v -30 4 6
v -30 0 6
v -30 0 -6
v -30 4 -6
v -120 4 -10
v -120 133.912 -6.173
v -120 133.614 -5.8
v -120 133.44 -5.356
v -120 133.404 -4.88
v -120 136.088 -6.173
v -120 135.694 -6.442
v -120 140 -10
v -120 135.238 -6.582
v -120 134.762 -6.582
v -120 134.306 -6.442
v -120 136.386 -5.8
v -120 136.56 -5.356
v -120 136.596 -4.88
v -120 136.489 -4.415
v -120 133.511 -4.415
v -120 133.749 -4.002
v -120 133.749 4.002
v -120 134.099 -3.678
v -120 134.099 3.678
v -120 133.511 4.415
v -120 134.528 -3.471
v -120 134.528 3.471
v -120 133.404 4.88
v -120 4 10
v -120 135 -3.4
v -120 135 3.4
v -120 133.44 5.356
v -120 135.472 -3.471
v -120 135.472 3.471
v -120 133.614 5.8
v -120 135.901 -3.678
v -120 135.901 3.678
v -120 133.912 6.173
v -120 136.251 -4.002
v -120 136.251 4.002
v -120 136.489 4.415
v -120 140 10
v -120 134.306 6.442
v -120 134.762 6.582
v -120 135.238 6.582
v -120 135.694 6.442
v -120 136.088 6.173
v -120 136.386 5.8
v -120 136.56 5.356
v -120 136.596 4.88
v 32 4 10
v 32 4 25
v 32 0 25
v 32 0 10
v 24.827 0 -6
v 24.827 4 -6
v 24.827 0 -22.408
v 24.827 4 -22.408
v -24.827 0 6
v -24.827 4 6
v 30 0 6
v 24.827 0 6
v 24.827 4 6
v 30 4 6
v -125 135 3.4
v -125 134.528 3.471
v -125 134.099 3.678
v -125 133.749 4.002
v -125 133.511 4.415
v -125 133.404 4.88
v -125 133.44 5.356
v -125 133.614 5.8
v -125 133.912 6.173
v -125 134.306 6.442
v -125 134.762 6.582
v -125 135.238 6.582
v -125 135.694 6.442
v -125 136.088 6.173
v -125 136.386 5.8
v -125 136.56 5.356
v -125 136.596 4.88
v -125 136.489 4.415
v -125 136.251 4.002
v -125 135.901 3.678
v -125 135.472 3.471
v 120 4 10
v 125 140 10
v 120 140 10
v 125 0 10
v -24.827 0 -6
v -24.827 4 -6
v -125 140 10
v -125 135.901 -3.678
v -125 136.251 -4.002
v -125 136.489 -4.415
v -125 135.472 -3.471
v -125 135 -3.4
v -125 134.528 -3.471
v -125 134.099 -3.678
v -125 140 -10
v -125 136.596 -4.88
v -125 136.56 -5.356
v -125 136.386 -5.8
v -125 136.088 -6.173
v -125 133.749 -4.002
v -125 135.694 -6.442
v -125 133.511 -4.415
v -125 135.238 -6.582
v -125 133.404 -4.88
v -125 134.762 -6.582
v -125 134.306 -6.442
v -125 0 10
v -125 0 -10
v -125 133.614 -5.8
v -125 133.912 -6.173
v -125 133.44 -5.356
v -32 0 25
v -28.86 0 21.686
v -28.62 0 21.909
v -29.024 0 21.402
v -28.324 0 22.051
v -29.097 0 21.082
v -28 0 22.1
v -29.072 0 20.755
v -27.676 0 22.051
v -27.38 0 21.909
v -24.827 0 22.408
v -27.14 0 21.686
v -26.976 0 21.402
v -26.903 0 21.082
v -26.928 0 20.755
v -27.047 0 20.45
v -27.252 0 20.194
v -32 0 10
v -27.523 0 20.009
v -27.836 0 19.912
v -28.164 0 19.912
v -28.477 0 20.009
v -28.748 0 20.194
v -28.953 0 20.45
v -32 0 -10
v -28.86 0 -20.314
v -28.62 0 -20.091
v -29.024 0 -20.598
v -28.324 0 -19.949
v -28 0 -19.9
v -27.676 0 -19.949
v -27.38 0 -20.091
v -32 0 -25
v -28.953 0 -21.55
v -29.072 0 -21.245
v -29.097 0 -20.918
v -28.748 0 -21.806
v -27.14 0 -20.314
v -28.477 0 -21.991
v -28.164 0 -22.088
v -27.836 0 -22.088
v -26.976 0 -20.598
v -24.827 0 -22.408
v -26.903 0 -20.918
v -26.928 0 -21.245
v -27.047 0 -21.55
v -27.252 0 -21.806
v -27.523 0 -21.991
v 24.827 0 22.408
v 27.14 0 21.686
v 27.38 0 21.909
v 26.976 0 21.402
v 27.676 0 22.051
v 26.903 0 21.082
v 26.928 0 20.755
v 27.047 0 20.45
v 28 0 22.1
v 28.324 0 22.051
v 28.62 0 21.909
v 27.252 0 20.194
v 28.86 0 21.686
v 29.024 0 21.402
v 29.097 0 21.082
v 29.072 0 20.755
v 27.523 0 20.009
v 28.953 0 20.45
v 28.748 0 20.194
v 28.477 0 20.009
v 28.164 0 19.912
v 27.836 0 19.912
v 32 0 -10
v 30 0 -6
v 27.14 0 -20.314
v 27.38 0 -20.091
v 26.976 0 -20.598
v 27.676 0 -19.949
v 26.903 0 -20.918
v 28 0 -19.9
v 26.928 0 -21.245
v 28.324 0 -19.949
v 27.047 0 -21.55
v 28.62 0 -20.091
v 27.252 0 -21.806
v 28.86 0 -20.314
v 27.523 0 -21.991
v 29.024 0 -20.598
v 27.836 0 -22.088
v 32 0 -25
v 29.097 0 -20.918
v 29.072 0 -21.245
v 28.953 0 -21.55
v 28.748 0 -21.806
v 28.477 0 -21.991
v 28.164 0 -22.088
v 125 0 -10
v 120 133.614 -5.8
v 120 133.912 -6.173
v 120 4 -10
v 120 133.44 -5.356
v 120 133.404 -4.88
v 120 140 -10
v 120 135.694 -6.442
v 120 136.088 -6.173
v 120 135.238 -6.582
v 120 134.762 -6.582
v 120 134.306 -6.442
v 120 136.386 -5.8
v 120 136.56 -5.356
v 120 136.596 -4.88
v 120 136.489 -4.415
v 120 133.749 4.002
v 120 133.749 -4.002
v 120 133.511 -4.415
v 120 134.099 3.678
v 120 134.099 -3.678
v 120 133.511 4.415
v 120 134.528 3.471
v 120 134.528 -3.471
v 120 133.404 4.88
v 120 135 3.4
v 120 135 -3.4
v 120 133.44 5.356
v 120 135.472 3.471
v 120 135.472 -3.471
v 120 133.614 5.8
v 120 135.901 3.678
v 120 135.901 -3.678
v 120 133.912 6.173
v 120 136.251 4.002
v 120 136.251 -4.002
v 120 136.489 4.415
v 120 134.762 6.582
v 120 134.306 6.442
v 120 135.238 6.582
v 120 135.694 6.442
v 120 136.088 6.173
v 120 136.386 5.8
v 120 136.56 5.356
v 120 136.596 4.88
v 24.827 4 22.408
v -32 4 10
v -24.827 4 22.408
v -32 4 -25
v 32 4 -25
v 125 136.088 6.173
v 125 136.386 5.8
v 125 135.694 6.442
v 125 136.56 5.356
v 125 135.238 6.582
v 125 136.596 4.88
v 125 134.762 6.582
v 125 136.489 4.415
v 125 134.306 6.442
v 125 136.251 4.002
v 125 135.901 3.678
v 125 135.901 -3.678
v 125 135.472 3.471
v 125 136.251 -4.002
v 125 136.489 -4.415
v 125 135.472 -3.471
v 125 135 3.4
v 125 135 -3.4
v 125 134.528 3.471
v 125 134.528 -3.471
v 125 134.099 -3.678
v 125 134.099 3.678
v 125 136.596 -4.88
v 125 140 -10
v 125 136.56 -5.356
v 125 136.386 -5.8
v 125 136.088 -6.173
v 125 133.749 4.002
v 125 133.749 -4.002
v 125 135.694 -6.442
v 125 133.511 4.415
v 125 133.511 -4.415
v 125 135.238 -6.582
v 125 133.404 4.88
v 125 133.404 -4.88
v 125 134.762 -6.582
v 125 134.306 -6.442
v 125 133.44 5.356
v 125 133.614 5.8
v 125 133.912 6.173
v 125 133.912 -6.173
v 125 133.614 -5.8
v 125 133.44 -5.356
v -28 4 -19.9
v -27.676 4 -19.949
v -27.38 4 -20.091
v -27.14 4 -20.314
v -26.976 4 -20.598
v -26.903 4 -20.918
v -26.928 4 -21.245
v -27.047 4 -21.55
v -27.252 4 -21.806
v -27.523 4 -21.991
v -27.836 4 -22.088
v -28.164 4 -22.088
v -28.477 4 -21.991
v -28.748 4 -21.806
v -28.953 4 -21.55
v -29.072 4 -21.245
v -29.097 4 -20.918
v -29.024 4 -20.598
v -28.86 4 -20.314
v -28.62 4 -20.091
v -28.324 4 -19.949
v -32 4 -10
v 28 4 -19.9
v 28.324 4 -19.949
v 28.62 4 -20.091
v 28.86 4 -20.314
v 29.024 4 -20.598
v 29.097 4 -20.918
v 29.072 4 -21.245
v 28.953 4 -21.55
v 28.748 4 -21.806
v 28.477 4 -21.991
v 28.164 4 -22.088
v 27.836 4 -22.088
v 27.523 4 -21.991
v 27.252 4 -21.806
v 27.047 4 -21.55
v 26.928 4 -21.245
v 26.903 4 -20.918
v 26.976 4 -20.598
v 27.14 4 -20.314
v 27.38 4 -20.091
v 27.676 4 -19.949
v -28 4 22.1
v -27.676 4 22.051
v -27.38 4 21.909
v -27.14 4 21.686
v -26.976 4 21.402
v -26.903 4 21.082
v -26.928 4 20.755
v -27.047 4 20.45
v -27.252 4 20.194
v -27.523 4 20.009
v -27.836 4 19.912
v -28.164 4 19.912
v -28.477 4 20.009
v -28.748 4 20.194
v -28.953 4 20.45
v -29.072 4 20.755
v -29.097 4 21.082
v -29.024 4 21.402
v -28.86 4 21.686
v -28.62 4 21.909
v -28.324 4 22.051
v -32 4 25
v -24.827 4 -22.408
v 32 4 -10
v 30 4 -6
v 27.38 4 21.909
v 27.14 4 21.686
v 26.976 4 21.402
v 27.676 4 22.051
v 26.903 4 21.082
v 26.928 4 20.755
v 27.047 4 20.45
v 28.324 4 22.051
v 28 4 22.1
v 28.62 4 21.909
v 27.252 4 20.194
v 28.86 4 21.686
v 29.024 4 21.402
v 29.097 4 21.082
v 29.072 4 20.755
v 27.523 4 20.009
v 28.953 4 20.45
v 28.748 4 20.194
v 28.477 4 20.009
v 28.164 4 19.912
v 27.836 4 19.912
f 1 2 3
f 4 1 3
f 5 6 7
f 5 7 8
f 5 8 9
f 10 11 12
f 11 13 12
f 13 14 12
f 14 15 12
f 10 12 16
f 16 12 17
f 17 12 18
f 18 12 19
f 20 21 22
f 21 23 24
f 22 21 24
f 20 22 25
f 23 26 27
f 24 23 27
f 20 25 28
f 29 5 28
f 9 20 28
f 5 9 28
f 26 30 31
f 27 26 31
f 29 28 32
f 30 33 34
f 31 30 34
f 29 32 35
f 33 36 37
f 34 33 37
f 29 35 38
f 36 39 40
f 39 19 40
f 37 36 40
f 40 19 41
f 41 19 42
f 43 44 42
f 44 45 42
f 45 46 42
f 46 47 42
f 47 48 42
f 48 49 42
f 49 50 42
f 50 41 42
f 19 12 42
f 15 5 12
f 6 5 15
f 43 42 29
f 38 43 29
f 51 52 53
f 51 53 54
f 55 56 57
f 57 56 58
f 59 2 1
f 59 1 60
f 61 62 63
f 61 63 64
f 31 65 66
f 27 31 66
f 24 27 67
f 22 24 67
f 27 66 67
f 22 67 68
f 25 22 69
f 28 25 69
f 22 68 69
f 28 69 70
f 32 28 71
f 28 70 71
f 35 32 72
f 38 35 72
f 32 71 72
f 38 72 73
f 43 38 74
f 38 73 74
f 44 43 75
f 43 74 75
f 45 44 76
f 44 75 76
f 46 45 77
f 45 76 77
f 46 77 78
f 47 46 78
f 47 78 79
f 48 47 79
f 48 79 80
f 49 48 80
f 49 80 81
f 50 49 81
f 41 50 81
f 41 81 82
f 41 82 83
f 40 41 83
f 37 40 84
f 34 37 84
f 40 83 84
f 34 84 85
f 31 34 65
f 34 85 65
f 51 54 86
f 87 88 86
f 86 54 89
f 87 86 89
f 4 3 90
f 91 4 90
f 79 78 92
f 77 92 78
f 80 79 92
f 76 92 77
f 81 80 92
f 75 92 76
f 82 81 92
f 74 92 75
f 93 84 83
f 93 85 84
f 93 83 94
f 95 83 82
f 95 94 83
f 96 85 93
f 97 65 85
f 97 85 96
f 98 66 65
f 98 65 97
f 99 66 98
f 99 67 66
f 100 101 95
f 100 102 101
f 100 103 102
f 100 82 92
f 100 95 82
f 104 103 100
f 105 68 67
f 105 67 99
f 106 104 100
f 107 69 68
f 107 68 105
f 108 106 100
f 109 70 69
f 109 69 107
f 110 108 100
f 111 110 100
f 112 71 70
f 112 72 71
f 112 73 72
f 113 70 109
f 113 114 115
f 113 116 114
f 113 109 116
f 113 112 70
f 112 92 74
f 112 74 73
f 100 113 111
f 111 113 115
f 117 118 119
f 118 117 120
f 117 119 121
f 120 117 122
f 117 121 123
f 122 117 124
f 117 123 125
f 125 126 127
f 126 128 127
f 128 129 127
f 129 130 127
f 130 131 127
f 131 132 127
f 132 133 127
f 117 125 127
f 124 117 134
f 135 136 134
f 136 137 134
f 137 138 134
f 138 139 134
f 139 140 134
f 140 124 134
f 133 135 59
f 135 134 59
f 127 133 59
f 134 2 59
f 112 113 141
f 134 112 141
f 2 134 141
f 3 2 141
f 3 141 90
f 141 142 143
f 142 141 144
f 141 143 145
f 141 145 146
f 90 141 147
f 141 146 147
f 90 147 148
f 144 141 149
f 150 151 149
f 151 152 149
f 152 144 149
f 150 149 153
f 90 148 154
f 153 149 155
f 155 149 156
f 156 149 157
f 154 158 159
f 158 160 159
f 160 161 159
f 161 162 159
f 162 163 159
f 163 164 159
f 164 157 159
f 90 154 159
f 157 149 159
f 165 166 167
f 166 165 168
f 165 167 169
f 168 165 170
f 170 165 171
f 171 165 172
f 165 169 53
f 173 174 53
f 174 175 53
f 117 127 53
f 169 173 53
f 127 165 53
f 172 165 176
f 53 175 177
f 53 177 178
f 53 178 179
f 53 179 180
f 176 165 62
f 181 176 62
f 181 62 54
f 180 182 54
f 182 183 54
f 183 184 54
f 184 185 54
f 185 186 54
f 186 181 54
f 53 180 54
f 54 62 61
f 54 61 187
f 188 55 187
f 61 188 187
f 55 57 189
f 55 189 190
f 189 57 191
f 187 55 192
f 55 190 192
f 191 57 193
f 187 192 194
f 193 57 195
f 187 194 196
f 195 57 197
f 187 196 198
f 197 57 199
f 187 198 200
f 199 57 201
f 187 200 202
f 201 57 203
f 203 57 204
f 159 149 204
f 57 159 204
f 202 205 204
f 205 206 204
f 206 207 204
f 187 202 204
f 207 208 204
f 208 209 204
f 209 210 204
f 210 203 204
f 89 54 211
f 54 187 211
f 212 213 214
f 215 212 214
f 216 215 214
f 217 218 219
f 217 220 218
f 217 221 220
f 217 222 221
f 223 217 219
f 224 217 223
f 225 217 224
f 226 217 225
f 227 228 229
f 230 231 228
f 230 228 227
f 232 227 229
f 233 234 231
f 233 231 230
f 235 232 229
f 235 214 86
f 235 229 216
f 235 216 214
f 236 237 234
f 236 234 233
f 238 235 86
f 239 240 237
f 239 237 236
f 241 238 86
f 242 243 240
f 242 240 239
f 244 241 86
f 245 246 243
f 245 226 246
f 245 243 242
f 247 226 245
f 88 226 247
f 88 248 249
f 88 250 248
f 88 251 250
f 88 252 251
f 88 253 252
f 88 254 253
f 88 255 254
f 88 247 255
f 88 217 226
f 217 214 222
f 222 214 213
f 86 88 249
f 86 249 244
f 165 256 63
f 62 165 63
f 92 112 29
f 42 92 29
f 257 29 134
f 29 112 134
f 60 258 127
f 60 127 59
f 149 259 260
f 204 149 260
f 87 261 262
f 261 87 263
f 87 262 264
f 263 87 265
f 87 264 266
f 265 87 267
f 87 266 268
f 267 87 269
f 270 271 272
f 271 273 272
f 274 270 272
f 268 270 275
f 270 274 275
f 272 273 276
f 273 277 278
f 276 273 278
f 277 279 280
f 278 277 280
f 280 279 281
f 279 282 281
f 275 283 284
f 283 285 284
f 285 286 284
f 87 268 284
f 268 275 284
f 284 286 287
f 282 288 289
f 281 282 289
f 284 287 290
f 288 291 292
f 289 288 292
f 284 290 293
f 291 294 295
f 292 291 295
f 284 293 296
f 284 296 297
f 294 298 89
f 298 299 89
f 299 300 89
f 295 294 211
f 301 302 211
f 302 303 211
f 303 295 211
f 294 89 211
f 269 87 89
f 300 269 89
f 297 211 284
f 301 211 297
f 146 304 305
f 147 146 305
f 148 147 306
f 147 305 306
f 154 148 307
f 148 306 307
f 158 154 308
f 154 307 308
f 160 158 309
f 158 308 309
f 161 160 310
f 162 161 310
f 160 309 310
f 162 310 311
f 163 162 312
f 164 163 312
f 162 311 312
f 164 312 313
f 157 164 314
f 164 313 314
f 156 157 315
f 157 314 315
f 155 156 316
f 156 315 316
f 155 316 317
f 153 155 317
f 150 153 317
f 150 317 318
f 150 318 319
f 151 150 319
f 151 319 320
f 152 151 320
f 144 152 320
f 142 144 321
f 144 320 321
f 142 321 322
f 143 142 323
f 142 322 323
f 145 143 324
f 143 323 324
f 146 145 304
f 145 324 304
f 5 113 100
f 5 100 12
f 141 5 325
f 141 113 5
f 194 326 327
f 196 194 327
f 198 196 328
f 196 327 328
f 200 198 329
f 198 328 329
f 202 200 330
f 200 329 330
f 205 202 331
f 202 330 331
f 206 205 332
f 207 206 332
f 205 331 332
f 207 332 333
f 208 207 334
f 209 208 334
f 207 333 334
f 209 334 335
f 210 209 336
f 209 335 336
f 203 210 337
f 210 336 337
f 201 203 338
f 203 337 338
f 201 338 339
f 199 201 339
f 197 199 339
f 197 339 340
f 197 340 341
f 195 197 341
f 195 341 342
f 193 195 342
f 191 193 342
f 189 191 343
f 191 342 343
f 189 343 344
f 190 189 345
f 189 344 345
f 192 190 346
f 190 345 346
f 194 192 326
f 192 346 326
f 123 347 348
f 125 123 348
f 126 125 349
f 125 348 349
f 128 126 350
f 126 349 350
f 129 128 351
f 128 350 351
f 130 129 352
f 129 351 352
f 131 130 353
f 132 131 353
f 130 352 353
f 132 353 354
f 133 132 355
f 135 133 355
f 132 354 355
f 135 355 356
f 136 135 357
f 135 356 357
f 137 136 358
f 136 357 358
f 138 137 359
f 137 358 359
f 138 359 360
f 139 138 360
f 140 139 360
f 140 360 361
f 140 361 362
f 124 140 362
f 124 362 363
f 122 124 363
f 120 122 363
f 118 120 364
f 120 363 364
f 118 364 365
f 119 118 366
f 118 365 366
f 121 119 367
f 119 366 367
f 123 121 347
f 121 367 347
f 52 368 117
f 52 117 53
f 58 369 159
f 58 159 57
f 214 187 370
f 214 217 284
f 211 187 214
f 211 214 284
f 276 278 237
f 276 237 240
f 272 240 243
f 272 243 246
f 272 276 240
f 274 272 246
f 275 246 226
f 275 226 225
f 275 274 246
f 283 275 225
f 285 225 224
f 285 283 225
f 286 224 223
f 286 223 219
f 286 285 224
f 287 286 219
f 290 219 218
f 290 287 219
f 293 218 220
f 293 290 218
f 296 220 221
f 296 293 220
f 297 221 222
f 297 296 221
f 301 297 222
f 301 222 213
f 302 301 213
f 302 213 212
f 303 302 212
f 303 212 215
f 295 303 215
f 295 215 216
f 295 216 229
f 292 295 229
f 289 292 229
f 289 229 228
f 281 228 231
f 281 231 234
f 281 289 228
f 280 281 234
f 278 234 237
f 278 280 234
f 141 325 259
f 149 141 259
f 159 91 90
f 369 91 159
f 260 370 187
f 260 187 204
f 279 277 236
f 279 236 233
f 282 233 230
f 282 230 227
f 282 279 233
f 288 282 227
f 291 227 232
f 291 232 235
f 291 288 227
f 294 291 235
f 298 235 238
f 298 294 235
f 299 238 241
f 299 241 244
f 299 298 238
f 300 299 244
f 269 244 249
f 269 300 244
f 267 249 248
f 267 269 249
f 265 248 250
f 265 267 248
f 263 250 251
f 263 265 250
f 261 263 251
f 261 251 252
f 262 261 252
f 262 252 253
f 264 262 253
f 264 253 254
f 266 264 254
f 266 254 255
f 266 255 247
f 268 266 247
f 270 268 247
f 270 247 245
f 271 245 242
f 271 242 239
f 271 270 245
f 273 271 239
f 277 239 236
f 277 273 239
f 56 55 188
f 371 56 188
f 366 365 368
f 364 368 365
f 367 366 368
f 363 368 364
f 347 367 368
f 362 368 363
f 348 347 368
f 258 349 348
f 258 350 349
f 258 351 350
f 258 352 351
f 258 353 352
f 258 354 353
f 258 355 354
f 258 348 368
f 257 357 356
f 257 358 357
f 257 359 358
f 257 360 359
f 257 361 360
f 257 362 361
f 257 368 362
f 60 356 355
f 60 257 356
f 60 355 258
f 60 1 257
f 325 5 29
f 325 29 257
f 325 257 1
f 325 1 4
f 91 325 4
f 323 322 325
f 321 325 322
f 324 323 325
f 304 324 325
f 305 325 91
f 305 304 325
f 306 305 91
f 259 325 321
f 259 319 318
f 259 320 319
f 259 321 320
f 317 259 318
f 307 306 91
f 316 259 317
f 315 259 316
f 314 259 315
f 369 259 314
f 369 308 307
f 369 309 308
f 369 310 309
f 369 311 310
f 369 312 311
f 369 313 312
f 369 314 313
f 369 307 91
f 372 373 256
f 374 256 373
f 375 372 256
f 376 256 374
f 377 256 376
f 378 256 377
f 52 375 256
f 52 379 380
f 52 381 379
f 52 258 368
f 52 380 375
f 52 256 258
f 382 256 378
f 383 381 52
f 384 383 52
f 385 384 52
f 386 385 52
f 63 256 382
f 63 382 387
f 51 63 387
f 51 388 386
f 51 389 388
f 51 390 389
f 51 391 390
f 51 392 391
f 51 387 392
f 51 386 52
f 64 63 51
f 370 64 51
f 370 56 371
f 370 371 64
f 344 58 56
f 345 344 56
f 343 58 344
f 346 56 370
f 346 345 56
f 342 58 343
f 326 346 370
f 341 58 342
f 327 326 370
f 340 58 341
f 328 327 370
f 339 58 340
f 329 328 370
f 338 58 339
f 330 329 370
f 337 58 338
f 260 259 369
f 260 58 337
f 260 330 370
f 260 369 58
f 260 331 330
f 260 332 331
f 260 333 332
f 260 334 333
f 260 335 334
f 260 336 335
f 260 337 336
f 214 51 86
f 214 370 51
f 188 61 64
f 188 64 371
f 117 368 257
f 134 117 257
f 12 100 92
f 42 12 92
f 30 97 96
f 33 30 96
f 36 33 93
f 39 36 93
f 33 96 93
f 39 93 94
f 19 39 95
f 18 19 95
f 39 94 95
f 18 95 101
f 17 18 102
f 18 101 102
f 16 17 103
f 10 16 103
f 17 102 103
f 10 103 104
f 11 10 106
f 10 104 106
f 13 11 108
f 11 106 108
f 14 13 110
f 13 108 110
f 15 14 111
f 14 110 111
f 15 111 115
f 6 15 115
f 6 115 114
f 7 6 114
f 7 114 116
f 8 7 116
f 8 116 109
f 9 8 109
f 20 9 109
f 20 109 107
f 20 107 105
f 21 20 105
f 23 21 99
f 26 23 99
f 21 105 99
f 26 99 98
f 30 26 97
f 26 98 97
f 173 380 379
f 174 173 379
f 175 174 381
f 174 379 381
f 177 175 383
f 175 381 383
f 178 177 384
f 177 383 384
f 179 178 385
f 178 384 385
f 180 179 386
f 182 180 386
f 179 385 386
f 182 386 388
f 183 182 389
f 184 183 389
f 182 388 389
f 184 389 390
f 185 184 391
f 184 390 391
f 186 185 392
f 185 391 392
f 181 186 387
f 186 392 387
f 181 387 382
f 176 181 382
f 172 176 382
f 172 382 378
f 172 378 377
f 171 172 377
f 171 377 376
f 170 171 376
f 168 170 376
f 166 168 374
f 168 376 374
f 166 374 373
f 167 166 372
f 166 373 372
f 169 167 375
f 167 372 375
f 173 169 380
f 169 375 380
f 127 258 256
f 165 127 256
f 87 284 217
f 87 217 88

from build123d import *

# Parameters (mm, degrees)
SKETCH_1_W          = 250
SKETCH_1_H          = 20
SKETCH_1_W_2        = 60
SKETCH_1_H_2        = 12
EXTRUDE_1_DEPTH     = 4
SKETCH_2_W          = 20
SKETCH_2_H          = 140
SKETCH_2_R          = 1.6
EXTRUDE_2_DEPTH     = 5
SKETCH_3_W          = 64
SKETCH_3_H          = 15
SKETCH_3_R          = 1.1
EXTRUDE_3_DEPTH     = 4
SKETCH_4_W          = 49.65332139
SKETCH_4_H          = 44.815301216
CUT_EXTRUDE_1_DEPTH = 4


with BuildPart() as part:
    # 草图1 → 凸台-拉伸1 (new body)
    with BuildSketch(Plane(origin=(0, 0, 0), x_dir=(1, 0, 0), z_dir=(0, 1, 0))):
        Rectangle(SKETCH_1_W, SKETCH_1_H)
        Rectangle(SKETCH_1_W_2, SKETCH_1_H_2, mode=Mode.SUBTRACT)
    extrude(amount=EXTRUDE_1_DEPTH)

    # 草图2 → 凸台-拉伸2 (add)
    with BuildSketch(Plane.ZY.offset(125)):
        with Locations((0, 70)):
            Rectangle(SKETCH_2_W, SKETCH_2_H)
        with Locations((-5, 135)):
            Circle(SKETCH_2_R, mode=Mode.SUBTRACT)
        with Locations(Location((5, 135, 0), (0, 0, 180))):
            Circle(SKETCH_2_R, mode=Mode.SUBTRACT)
    extrude_2 = extrude(amount=-EXTRUDE_2_DEPTH)

    # 镜向1: 凸台-拉伸2 across plane
    add(extrude_2.mirror(Plane(origin=(0, 0, 0), x_dir=(0, 0, 1), z_dir=(1, 0, 0))))

    # 草图3 → 凸台-拉伸3 (add)
    # profile 1 of 2: a face of its own
    with BuildSketch(Plane(origin=(0, 4, 0), x_dir=(1, 0, 0), z_dir=(0, 1, 0))):
        with Locations((0, 17.5)):
            Rectangle(SKETCH_3_W, SKETCH_3_H)
        with Locations(Location((-28, 21, 0), (0, 0, 270))):
            Circle(SKETCH_3_R, mode=Mode.SUBTRACT)
        with Locations(Location((28, 21, 0), (0, 0, 270))):
            Circle(SKETCH_3_R, mode=Mode.SUBTRACT)
    # profile 2 of 2: a face of its own
    with BuildSketch(Plane(origin=(0, 4, 0), x_dir=(1, 0, 0), z_dir=(0, 1, 0))):
        with Locations((0, -17.5)):
            Rectangle(SKETCH_3_W, SKETCH_3_H)
        with Locations(Location((-28, -21, 0), (0, 0, 270))):
            Circle(SKETCH_3_R, mode=Mode.SUBTRACT)
        with Locations(Location((28, -21, 0), (0, 0, 270))):
            Circle(SKETCH_3_R, mode=Mode.SUBTRACT)
    extrude(amount=-EXTRUDE_3_DEPTH)

    # 草图4 → 切除-拉伸1 (cut)
    with BuildSketch(Plane(origin=(0, 4, 0), x_dir=(1, 0, 0), z_dir=(0, 1, 0))):
        Rectangle(SKETCH_4_W, SKETCH_4_H)
    extrude(amount=-CUT_EXTRUDE_1_DEPTH, mode=Mode.SUBTRACT)


solid = part.part
